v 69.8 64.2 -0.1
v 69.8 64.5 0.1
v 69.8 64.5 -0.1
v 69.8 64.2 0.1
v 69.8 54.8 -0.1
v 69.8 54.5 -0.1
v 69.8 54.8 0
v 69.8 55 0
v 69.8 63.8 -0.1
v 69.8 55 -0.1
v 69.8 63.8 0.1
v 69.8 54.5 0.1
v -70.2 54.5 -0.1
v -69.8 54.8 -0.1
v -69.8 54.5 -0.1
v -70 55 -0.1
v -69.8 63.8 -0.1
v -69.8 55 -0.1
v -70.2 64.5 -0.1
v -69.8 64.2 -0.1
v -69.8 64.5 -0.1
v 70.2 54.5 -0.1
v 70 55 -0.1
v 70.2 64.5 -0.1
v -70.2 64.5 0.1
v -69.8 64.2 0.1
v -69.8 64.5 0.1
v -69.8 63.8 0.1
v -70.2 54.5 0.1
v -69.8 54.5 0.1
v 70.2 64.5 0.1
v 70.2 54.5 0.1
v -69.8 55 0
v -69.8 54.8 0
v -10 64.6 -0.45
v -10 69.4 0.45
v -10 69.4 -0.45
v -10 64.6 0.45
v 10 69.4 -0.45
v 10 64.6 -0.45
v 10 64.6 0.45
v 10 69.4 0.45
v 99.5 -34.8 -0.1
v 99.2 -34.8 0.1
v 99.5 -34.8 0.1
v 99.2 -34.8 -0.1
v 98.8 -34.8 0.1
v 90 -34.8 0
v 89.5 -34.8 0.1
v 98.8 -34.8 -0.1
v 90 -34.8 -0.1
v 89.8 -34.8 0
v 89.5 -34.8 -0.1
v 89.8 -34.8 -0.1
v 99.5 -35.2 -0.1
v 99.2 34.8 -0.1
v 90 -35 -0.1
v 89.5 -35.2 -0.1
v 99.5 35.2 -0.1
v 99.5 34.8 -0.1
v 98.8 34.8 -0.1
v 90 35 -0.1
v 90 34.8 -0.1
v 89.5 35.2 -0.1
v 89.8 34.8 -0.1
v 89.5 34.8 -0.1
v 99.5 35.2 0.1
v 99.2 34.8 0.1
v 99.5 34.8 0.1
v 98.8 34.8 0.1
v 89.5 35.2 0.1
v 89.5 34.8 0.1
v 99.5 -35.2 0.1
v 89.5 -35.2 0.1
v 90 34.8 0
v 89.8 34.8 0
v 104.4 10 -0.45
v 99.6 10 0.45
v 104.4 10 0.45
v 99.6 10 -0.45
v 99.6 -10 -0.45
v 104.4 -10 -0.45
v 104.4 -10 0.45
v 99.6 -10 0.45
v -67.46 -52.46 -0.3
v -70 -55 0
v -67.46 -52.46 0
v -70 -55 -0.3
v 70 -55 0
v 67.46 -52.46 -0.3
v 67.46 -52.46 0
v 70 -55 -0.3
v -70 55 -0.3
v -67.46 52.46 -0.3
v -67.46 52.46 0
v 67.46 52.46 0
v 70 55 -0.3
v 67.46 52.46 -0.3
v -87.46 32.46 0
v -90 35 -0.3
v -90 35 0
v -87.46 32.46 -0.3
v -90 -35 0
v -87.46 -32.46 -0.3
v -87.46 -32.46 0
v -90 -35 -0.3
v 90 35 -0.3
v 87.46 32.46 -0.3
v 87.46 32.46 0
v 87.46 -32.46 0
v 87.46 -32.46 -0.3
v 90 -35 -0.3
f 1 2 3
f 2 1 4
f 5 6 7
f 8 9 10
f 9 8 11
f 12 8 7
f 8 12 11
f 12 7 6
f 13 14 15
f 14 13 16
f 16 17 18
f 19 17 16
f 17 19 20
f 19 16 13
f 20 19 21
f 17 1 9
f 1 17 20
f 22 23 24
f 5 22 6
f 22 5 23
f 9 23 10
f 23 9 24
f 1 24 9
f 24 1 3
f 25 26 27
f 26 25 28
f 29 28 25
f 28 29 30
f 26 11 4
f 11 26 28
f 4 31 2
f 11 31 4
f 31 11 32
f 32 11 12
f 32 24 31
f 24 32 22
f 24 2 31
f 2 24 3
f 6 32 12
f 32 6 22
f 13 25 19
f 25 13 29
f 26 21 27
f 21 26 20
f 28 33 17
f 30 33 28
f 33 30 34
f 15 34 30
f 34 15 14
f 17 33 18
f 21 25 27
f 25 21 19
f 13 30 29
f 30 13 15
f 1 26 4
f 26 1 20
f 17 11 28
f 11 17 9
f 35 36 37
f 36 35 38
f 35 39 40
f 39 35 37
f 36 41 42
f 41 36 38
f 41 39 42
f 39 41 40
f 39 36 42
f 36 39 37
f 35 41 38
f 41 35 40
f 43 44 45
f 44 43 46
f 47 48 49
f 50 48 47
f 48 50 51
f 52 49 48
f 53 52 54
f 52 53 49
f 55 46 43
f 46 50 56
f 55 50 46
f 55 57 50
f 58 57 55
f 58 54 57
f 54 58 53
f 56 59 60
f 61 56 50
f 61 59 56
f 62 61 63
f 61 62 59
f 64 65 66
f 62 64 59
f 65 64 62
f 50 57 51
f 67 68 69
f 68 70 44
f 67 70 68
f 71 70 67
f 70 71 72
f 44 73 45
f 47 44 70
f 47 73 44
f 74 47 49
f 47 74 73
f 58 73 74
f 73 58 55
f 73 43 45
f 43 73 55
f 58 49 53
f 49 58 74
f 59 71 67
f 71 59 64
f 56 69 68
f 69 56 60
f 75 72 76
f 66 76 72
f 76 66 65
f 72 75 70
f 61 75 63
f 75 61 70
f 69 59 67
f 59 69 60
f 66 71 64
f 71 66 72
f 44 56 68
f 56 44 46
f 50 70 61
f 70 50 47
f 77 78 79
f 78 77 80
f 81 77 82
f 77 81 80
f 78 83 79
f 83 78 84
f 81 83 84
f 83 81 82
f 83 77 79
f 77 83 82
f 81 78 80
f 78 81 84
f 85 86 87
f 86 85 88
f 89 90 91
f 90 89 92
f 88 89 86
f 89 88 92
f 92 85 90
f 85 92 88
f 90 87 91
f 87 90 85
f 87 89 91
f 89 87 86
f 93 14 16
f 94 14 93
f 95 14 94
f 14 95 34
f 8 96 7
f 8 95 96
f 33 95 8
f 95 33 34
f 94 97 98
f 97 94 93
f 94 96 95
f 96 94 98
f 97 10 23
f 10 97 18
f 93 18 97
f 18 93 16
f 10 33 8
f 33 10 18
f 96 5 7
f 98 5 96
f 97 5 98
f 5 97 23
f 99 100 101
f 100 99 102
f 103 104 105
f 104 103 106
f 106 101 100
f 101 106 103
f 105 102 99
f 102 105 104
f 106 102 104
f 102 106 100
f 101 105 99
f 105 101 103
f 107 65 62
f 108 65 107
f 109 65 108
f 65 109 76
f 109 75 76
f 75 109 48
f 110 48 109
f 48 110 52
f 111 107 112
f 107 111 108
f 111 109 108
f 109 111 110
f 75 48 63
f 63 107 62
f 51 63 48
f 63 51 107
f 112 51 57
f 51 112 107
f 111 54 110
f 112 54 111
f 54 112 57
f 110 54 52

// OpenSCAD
// file: hdim.scad
module hdim(x1 = 10, x2 = 200, y = 10, dimline_lenght = 9.0) 
{
    dimline_overlap = 0.5;
    dimline_width = 0.4;
    text_size = 4;
    tmp = 2*dimline_overlap+text_size/2;
    text_pos = dimline_lenght>0 ? tmp : -tmp; 
    dimline_abs = dimline_lenght>0 ? dimline_lenght : -dimline_lenght;
    
    color([146/255, 154/255, 255/255, 0.7])
    {
        translate([x1,y-dimline_lenght/2,0]) 
            cube([dimline_width, 
                dimline_abs + 2*dimline_overlap,
                dimline_width/2], 
                center=true);
                
        translate([x2,y-dimline_lenght/2,0]) 
            cube([dimline_width, 
                dimline_abs + 2*dimline_overlap,
                dimline_width/2], 
                center=true);

        translate([(x1+x2)/2,y-dimline_lenght,0]) 
            cube([x2-x1, 
                dimline_width,
                dimline_width/2], 
                center=true);
    }
        
    translate([(x1+x2)/2,y-dimline_lenght-text_pos,0]) 
    {
        color([106/255, 134/255, 245/255])
        cube([text_size * 5, 1.2*text_size, 0.9], center=true);
        
        color([0,0,0,1])
        {
            translate([0,0,0.2])
            text(str(0.1*round((x2-x1)*10)), size = text_size, 
                halign = "center",valign = "center");
            translate([0,0,-0.2])
            rotate([0,180,0])
            text(str(0.1*round((x2-x1)*10)), size = text_size, 
                halign = "center",valign = "center");
        }
    }
}

hdim();
// main file
use <hdim.scad> 

default_bar_diam = 3.8;
default_bar_t  = 0.3;

module rectangularframe(length = 140, width = 70, 
    bar_diam = default_bar_diam, 
    bar_t = default_bar_t, 
    explode=false, 
    c1 = [0.5,0.28,0.19, 1.0], 
    c2 = [0.8,0.30,0.29, 1.0])
{
    d = explode ? 20 : 0;
      
    rotate([0,180,0])
    {
        translate([-length/2,-d-width/2,0]) 
        
        rectangularmetal(length, bar_diam, bar_t, c2);
        if (explode) {
            hdim(-length/2, length/2, width/2+d, -9);
        }
        
        translate([length/2,width/2+d,0]) 
        rotate([0,0,180]) 
        rectangularmetal(length, bar_diam, bar_t, c1);
        
        translate([d+length/2,-width/2,0]) 
        rotate([0,0,90]) rectangularmetal(width, bar_diam, bar_t, c2);
        if (explode) {
            rotate([0,0,90]) 
            hdim(-width/2, width/2, length/2+d, -9);
        }
        
        translate([-length/2-d,width/2,0]) 
        rotate([0,0,-90])
        rectangularmetal(width, bar_diam, bar_t, c1);
    }
}        

module rectangularmetal(length, 
    bar_diam = default_bar_diam, 
    bar_t = default_bar_t,
    c = [0.5,0.28,0.19, 1.0])
{
    color(c) 
    {
        linear_extrude(bar_t) 
        polygon(points=[[0,0],
            [bar_diam, bar_diam],
            [length-bar_diam, bar_diam],
            [length, 0], [0,0]]);
    }
}   


rectangularframe(explode=true, bar_diam = 2.54, bar_t=0.3);
